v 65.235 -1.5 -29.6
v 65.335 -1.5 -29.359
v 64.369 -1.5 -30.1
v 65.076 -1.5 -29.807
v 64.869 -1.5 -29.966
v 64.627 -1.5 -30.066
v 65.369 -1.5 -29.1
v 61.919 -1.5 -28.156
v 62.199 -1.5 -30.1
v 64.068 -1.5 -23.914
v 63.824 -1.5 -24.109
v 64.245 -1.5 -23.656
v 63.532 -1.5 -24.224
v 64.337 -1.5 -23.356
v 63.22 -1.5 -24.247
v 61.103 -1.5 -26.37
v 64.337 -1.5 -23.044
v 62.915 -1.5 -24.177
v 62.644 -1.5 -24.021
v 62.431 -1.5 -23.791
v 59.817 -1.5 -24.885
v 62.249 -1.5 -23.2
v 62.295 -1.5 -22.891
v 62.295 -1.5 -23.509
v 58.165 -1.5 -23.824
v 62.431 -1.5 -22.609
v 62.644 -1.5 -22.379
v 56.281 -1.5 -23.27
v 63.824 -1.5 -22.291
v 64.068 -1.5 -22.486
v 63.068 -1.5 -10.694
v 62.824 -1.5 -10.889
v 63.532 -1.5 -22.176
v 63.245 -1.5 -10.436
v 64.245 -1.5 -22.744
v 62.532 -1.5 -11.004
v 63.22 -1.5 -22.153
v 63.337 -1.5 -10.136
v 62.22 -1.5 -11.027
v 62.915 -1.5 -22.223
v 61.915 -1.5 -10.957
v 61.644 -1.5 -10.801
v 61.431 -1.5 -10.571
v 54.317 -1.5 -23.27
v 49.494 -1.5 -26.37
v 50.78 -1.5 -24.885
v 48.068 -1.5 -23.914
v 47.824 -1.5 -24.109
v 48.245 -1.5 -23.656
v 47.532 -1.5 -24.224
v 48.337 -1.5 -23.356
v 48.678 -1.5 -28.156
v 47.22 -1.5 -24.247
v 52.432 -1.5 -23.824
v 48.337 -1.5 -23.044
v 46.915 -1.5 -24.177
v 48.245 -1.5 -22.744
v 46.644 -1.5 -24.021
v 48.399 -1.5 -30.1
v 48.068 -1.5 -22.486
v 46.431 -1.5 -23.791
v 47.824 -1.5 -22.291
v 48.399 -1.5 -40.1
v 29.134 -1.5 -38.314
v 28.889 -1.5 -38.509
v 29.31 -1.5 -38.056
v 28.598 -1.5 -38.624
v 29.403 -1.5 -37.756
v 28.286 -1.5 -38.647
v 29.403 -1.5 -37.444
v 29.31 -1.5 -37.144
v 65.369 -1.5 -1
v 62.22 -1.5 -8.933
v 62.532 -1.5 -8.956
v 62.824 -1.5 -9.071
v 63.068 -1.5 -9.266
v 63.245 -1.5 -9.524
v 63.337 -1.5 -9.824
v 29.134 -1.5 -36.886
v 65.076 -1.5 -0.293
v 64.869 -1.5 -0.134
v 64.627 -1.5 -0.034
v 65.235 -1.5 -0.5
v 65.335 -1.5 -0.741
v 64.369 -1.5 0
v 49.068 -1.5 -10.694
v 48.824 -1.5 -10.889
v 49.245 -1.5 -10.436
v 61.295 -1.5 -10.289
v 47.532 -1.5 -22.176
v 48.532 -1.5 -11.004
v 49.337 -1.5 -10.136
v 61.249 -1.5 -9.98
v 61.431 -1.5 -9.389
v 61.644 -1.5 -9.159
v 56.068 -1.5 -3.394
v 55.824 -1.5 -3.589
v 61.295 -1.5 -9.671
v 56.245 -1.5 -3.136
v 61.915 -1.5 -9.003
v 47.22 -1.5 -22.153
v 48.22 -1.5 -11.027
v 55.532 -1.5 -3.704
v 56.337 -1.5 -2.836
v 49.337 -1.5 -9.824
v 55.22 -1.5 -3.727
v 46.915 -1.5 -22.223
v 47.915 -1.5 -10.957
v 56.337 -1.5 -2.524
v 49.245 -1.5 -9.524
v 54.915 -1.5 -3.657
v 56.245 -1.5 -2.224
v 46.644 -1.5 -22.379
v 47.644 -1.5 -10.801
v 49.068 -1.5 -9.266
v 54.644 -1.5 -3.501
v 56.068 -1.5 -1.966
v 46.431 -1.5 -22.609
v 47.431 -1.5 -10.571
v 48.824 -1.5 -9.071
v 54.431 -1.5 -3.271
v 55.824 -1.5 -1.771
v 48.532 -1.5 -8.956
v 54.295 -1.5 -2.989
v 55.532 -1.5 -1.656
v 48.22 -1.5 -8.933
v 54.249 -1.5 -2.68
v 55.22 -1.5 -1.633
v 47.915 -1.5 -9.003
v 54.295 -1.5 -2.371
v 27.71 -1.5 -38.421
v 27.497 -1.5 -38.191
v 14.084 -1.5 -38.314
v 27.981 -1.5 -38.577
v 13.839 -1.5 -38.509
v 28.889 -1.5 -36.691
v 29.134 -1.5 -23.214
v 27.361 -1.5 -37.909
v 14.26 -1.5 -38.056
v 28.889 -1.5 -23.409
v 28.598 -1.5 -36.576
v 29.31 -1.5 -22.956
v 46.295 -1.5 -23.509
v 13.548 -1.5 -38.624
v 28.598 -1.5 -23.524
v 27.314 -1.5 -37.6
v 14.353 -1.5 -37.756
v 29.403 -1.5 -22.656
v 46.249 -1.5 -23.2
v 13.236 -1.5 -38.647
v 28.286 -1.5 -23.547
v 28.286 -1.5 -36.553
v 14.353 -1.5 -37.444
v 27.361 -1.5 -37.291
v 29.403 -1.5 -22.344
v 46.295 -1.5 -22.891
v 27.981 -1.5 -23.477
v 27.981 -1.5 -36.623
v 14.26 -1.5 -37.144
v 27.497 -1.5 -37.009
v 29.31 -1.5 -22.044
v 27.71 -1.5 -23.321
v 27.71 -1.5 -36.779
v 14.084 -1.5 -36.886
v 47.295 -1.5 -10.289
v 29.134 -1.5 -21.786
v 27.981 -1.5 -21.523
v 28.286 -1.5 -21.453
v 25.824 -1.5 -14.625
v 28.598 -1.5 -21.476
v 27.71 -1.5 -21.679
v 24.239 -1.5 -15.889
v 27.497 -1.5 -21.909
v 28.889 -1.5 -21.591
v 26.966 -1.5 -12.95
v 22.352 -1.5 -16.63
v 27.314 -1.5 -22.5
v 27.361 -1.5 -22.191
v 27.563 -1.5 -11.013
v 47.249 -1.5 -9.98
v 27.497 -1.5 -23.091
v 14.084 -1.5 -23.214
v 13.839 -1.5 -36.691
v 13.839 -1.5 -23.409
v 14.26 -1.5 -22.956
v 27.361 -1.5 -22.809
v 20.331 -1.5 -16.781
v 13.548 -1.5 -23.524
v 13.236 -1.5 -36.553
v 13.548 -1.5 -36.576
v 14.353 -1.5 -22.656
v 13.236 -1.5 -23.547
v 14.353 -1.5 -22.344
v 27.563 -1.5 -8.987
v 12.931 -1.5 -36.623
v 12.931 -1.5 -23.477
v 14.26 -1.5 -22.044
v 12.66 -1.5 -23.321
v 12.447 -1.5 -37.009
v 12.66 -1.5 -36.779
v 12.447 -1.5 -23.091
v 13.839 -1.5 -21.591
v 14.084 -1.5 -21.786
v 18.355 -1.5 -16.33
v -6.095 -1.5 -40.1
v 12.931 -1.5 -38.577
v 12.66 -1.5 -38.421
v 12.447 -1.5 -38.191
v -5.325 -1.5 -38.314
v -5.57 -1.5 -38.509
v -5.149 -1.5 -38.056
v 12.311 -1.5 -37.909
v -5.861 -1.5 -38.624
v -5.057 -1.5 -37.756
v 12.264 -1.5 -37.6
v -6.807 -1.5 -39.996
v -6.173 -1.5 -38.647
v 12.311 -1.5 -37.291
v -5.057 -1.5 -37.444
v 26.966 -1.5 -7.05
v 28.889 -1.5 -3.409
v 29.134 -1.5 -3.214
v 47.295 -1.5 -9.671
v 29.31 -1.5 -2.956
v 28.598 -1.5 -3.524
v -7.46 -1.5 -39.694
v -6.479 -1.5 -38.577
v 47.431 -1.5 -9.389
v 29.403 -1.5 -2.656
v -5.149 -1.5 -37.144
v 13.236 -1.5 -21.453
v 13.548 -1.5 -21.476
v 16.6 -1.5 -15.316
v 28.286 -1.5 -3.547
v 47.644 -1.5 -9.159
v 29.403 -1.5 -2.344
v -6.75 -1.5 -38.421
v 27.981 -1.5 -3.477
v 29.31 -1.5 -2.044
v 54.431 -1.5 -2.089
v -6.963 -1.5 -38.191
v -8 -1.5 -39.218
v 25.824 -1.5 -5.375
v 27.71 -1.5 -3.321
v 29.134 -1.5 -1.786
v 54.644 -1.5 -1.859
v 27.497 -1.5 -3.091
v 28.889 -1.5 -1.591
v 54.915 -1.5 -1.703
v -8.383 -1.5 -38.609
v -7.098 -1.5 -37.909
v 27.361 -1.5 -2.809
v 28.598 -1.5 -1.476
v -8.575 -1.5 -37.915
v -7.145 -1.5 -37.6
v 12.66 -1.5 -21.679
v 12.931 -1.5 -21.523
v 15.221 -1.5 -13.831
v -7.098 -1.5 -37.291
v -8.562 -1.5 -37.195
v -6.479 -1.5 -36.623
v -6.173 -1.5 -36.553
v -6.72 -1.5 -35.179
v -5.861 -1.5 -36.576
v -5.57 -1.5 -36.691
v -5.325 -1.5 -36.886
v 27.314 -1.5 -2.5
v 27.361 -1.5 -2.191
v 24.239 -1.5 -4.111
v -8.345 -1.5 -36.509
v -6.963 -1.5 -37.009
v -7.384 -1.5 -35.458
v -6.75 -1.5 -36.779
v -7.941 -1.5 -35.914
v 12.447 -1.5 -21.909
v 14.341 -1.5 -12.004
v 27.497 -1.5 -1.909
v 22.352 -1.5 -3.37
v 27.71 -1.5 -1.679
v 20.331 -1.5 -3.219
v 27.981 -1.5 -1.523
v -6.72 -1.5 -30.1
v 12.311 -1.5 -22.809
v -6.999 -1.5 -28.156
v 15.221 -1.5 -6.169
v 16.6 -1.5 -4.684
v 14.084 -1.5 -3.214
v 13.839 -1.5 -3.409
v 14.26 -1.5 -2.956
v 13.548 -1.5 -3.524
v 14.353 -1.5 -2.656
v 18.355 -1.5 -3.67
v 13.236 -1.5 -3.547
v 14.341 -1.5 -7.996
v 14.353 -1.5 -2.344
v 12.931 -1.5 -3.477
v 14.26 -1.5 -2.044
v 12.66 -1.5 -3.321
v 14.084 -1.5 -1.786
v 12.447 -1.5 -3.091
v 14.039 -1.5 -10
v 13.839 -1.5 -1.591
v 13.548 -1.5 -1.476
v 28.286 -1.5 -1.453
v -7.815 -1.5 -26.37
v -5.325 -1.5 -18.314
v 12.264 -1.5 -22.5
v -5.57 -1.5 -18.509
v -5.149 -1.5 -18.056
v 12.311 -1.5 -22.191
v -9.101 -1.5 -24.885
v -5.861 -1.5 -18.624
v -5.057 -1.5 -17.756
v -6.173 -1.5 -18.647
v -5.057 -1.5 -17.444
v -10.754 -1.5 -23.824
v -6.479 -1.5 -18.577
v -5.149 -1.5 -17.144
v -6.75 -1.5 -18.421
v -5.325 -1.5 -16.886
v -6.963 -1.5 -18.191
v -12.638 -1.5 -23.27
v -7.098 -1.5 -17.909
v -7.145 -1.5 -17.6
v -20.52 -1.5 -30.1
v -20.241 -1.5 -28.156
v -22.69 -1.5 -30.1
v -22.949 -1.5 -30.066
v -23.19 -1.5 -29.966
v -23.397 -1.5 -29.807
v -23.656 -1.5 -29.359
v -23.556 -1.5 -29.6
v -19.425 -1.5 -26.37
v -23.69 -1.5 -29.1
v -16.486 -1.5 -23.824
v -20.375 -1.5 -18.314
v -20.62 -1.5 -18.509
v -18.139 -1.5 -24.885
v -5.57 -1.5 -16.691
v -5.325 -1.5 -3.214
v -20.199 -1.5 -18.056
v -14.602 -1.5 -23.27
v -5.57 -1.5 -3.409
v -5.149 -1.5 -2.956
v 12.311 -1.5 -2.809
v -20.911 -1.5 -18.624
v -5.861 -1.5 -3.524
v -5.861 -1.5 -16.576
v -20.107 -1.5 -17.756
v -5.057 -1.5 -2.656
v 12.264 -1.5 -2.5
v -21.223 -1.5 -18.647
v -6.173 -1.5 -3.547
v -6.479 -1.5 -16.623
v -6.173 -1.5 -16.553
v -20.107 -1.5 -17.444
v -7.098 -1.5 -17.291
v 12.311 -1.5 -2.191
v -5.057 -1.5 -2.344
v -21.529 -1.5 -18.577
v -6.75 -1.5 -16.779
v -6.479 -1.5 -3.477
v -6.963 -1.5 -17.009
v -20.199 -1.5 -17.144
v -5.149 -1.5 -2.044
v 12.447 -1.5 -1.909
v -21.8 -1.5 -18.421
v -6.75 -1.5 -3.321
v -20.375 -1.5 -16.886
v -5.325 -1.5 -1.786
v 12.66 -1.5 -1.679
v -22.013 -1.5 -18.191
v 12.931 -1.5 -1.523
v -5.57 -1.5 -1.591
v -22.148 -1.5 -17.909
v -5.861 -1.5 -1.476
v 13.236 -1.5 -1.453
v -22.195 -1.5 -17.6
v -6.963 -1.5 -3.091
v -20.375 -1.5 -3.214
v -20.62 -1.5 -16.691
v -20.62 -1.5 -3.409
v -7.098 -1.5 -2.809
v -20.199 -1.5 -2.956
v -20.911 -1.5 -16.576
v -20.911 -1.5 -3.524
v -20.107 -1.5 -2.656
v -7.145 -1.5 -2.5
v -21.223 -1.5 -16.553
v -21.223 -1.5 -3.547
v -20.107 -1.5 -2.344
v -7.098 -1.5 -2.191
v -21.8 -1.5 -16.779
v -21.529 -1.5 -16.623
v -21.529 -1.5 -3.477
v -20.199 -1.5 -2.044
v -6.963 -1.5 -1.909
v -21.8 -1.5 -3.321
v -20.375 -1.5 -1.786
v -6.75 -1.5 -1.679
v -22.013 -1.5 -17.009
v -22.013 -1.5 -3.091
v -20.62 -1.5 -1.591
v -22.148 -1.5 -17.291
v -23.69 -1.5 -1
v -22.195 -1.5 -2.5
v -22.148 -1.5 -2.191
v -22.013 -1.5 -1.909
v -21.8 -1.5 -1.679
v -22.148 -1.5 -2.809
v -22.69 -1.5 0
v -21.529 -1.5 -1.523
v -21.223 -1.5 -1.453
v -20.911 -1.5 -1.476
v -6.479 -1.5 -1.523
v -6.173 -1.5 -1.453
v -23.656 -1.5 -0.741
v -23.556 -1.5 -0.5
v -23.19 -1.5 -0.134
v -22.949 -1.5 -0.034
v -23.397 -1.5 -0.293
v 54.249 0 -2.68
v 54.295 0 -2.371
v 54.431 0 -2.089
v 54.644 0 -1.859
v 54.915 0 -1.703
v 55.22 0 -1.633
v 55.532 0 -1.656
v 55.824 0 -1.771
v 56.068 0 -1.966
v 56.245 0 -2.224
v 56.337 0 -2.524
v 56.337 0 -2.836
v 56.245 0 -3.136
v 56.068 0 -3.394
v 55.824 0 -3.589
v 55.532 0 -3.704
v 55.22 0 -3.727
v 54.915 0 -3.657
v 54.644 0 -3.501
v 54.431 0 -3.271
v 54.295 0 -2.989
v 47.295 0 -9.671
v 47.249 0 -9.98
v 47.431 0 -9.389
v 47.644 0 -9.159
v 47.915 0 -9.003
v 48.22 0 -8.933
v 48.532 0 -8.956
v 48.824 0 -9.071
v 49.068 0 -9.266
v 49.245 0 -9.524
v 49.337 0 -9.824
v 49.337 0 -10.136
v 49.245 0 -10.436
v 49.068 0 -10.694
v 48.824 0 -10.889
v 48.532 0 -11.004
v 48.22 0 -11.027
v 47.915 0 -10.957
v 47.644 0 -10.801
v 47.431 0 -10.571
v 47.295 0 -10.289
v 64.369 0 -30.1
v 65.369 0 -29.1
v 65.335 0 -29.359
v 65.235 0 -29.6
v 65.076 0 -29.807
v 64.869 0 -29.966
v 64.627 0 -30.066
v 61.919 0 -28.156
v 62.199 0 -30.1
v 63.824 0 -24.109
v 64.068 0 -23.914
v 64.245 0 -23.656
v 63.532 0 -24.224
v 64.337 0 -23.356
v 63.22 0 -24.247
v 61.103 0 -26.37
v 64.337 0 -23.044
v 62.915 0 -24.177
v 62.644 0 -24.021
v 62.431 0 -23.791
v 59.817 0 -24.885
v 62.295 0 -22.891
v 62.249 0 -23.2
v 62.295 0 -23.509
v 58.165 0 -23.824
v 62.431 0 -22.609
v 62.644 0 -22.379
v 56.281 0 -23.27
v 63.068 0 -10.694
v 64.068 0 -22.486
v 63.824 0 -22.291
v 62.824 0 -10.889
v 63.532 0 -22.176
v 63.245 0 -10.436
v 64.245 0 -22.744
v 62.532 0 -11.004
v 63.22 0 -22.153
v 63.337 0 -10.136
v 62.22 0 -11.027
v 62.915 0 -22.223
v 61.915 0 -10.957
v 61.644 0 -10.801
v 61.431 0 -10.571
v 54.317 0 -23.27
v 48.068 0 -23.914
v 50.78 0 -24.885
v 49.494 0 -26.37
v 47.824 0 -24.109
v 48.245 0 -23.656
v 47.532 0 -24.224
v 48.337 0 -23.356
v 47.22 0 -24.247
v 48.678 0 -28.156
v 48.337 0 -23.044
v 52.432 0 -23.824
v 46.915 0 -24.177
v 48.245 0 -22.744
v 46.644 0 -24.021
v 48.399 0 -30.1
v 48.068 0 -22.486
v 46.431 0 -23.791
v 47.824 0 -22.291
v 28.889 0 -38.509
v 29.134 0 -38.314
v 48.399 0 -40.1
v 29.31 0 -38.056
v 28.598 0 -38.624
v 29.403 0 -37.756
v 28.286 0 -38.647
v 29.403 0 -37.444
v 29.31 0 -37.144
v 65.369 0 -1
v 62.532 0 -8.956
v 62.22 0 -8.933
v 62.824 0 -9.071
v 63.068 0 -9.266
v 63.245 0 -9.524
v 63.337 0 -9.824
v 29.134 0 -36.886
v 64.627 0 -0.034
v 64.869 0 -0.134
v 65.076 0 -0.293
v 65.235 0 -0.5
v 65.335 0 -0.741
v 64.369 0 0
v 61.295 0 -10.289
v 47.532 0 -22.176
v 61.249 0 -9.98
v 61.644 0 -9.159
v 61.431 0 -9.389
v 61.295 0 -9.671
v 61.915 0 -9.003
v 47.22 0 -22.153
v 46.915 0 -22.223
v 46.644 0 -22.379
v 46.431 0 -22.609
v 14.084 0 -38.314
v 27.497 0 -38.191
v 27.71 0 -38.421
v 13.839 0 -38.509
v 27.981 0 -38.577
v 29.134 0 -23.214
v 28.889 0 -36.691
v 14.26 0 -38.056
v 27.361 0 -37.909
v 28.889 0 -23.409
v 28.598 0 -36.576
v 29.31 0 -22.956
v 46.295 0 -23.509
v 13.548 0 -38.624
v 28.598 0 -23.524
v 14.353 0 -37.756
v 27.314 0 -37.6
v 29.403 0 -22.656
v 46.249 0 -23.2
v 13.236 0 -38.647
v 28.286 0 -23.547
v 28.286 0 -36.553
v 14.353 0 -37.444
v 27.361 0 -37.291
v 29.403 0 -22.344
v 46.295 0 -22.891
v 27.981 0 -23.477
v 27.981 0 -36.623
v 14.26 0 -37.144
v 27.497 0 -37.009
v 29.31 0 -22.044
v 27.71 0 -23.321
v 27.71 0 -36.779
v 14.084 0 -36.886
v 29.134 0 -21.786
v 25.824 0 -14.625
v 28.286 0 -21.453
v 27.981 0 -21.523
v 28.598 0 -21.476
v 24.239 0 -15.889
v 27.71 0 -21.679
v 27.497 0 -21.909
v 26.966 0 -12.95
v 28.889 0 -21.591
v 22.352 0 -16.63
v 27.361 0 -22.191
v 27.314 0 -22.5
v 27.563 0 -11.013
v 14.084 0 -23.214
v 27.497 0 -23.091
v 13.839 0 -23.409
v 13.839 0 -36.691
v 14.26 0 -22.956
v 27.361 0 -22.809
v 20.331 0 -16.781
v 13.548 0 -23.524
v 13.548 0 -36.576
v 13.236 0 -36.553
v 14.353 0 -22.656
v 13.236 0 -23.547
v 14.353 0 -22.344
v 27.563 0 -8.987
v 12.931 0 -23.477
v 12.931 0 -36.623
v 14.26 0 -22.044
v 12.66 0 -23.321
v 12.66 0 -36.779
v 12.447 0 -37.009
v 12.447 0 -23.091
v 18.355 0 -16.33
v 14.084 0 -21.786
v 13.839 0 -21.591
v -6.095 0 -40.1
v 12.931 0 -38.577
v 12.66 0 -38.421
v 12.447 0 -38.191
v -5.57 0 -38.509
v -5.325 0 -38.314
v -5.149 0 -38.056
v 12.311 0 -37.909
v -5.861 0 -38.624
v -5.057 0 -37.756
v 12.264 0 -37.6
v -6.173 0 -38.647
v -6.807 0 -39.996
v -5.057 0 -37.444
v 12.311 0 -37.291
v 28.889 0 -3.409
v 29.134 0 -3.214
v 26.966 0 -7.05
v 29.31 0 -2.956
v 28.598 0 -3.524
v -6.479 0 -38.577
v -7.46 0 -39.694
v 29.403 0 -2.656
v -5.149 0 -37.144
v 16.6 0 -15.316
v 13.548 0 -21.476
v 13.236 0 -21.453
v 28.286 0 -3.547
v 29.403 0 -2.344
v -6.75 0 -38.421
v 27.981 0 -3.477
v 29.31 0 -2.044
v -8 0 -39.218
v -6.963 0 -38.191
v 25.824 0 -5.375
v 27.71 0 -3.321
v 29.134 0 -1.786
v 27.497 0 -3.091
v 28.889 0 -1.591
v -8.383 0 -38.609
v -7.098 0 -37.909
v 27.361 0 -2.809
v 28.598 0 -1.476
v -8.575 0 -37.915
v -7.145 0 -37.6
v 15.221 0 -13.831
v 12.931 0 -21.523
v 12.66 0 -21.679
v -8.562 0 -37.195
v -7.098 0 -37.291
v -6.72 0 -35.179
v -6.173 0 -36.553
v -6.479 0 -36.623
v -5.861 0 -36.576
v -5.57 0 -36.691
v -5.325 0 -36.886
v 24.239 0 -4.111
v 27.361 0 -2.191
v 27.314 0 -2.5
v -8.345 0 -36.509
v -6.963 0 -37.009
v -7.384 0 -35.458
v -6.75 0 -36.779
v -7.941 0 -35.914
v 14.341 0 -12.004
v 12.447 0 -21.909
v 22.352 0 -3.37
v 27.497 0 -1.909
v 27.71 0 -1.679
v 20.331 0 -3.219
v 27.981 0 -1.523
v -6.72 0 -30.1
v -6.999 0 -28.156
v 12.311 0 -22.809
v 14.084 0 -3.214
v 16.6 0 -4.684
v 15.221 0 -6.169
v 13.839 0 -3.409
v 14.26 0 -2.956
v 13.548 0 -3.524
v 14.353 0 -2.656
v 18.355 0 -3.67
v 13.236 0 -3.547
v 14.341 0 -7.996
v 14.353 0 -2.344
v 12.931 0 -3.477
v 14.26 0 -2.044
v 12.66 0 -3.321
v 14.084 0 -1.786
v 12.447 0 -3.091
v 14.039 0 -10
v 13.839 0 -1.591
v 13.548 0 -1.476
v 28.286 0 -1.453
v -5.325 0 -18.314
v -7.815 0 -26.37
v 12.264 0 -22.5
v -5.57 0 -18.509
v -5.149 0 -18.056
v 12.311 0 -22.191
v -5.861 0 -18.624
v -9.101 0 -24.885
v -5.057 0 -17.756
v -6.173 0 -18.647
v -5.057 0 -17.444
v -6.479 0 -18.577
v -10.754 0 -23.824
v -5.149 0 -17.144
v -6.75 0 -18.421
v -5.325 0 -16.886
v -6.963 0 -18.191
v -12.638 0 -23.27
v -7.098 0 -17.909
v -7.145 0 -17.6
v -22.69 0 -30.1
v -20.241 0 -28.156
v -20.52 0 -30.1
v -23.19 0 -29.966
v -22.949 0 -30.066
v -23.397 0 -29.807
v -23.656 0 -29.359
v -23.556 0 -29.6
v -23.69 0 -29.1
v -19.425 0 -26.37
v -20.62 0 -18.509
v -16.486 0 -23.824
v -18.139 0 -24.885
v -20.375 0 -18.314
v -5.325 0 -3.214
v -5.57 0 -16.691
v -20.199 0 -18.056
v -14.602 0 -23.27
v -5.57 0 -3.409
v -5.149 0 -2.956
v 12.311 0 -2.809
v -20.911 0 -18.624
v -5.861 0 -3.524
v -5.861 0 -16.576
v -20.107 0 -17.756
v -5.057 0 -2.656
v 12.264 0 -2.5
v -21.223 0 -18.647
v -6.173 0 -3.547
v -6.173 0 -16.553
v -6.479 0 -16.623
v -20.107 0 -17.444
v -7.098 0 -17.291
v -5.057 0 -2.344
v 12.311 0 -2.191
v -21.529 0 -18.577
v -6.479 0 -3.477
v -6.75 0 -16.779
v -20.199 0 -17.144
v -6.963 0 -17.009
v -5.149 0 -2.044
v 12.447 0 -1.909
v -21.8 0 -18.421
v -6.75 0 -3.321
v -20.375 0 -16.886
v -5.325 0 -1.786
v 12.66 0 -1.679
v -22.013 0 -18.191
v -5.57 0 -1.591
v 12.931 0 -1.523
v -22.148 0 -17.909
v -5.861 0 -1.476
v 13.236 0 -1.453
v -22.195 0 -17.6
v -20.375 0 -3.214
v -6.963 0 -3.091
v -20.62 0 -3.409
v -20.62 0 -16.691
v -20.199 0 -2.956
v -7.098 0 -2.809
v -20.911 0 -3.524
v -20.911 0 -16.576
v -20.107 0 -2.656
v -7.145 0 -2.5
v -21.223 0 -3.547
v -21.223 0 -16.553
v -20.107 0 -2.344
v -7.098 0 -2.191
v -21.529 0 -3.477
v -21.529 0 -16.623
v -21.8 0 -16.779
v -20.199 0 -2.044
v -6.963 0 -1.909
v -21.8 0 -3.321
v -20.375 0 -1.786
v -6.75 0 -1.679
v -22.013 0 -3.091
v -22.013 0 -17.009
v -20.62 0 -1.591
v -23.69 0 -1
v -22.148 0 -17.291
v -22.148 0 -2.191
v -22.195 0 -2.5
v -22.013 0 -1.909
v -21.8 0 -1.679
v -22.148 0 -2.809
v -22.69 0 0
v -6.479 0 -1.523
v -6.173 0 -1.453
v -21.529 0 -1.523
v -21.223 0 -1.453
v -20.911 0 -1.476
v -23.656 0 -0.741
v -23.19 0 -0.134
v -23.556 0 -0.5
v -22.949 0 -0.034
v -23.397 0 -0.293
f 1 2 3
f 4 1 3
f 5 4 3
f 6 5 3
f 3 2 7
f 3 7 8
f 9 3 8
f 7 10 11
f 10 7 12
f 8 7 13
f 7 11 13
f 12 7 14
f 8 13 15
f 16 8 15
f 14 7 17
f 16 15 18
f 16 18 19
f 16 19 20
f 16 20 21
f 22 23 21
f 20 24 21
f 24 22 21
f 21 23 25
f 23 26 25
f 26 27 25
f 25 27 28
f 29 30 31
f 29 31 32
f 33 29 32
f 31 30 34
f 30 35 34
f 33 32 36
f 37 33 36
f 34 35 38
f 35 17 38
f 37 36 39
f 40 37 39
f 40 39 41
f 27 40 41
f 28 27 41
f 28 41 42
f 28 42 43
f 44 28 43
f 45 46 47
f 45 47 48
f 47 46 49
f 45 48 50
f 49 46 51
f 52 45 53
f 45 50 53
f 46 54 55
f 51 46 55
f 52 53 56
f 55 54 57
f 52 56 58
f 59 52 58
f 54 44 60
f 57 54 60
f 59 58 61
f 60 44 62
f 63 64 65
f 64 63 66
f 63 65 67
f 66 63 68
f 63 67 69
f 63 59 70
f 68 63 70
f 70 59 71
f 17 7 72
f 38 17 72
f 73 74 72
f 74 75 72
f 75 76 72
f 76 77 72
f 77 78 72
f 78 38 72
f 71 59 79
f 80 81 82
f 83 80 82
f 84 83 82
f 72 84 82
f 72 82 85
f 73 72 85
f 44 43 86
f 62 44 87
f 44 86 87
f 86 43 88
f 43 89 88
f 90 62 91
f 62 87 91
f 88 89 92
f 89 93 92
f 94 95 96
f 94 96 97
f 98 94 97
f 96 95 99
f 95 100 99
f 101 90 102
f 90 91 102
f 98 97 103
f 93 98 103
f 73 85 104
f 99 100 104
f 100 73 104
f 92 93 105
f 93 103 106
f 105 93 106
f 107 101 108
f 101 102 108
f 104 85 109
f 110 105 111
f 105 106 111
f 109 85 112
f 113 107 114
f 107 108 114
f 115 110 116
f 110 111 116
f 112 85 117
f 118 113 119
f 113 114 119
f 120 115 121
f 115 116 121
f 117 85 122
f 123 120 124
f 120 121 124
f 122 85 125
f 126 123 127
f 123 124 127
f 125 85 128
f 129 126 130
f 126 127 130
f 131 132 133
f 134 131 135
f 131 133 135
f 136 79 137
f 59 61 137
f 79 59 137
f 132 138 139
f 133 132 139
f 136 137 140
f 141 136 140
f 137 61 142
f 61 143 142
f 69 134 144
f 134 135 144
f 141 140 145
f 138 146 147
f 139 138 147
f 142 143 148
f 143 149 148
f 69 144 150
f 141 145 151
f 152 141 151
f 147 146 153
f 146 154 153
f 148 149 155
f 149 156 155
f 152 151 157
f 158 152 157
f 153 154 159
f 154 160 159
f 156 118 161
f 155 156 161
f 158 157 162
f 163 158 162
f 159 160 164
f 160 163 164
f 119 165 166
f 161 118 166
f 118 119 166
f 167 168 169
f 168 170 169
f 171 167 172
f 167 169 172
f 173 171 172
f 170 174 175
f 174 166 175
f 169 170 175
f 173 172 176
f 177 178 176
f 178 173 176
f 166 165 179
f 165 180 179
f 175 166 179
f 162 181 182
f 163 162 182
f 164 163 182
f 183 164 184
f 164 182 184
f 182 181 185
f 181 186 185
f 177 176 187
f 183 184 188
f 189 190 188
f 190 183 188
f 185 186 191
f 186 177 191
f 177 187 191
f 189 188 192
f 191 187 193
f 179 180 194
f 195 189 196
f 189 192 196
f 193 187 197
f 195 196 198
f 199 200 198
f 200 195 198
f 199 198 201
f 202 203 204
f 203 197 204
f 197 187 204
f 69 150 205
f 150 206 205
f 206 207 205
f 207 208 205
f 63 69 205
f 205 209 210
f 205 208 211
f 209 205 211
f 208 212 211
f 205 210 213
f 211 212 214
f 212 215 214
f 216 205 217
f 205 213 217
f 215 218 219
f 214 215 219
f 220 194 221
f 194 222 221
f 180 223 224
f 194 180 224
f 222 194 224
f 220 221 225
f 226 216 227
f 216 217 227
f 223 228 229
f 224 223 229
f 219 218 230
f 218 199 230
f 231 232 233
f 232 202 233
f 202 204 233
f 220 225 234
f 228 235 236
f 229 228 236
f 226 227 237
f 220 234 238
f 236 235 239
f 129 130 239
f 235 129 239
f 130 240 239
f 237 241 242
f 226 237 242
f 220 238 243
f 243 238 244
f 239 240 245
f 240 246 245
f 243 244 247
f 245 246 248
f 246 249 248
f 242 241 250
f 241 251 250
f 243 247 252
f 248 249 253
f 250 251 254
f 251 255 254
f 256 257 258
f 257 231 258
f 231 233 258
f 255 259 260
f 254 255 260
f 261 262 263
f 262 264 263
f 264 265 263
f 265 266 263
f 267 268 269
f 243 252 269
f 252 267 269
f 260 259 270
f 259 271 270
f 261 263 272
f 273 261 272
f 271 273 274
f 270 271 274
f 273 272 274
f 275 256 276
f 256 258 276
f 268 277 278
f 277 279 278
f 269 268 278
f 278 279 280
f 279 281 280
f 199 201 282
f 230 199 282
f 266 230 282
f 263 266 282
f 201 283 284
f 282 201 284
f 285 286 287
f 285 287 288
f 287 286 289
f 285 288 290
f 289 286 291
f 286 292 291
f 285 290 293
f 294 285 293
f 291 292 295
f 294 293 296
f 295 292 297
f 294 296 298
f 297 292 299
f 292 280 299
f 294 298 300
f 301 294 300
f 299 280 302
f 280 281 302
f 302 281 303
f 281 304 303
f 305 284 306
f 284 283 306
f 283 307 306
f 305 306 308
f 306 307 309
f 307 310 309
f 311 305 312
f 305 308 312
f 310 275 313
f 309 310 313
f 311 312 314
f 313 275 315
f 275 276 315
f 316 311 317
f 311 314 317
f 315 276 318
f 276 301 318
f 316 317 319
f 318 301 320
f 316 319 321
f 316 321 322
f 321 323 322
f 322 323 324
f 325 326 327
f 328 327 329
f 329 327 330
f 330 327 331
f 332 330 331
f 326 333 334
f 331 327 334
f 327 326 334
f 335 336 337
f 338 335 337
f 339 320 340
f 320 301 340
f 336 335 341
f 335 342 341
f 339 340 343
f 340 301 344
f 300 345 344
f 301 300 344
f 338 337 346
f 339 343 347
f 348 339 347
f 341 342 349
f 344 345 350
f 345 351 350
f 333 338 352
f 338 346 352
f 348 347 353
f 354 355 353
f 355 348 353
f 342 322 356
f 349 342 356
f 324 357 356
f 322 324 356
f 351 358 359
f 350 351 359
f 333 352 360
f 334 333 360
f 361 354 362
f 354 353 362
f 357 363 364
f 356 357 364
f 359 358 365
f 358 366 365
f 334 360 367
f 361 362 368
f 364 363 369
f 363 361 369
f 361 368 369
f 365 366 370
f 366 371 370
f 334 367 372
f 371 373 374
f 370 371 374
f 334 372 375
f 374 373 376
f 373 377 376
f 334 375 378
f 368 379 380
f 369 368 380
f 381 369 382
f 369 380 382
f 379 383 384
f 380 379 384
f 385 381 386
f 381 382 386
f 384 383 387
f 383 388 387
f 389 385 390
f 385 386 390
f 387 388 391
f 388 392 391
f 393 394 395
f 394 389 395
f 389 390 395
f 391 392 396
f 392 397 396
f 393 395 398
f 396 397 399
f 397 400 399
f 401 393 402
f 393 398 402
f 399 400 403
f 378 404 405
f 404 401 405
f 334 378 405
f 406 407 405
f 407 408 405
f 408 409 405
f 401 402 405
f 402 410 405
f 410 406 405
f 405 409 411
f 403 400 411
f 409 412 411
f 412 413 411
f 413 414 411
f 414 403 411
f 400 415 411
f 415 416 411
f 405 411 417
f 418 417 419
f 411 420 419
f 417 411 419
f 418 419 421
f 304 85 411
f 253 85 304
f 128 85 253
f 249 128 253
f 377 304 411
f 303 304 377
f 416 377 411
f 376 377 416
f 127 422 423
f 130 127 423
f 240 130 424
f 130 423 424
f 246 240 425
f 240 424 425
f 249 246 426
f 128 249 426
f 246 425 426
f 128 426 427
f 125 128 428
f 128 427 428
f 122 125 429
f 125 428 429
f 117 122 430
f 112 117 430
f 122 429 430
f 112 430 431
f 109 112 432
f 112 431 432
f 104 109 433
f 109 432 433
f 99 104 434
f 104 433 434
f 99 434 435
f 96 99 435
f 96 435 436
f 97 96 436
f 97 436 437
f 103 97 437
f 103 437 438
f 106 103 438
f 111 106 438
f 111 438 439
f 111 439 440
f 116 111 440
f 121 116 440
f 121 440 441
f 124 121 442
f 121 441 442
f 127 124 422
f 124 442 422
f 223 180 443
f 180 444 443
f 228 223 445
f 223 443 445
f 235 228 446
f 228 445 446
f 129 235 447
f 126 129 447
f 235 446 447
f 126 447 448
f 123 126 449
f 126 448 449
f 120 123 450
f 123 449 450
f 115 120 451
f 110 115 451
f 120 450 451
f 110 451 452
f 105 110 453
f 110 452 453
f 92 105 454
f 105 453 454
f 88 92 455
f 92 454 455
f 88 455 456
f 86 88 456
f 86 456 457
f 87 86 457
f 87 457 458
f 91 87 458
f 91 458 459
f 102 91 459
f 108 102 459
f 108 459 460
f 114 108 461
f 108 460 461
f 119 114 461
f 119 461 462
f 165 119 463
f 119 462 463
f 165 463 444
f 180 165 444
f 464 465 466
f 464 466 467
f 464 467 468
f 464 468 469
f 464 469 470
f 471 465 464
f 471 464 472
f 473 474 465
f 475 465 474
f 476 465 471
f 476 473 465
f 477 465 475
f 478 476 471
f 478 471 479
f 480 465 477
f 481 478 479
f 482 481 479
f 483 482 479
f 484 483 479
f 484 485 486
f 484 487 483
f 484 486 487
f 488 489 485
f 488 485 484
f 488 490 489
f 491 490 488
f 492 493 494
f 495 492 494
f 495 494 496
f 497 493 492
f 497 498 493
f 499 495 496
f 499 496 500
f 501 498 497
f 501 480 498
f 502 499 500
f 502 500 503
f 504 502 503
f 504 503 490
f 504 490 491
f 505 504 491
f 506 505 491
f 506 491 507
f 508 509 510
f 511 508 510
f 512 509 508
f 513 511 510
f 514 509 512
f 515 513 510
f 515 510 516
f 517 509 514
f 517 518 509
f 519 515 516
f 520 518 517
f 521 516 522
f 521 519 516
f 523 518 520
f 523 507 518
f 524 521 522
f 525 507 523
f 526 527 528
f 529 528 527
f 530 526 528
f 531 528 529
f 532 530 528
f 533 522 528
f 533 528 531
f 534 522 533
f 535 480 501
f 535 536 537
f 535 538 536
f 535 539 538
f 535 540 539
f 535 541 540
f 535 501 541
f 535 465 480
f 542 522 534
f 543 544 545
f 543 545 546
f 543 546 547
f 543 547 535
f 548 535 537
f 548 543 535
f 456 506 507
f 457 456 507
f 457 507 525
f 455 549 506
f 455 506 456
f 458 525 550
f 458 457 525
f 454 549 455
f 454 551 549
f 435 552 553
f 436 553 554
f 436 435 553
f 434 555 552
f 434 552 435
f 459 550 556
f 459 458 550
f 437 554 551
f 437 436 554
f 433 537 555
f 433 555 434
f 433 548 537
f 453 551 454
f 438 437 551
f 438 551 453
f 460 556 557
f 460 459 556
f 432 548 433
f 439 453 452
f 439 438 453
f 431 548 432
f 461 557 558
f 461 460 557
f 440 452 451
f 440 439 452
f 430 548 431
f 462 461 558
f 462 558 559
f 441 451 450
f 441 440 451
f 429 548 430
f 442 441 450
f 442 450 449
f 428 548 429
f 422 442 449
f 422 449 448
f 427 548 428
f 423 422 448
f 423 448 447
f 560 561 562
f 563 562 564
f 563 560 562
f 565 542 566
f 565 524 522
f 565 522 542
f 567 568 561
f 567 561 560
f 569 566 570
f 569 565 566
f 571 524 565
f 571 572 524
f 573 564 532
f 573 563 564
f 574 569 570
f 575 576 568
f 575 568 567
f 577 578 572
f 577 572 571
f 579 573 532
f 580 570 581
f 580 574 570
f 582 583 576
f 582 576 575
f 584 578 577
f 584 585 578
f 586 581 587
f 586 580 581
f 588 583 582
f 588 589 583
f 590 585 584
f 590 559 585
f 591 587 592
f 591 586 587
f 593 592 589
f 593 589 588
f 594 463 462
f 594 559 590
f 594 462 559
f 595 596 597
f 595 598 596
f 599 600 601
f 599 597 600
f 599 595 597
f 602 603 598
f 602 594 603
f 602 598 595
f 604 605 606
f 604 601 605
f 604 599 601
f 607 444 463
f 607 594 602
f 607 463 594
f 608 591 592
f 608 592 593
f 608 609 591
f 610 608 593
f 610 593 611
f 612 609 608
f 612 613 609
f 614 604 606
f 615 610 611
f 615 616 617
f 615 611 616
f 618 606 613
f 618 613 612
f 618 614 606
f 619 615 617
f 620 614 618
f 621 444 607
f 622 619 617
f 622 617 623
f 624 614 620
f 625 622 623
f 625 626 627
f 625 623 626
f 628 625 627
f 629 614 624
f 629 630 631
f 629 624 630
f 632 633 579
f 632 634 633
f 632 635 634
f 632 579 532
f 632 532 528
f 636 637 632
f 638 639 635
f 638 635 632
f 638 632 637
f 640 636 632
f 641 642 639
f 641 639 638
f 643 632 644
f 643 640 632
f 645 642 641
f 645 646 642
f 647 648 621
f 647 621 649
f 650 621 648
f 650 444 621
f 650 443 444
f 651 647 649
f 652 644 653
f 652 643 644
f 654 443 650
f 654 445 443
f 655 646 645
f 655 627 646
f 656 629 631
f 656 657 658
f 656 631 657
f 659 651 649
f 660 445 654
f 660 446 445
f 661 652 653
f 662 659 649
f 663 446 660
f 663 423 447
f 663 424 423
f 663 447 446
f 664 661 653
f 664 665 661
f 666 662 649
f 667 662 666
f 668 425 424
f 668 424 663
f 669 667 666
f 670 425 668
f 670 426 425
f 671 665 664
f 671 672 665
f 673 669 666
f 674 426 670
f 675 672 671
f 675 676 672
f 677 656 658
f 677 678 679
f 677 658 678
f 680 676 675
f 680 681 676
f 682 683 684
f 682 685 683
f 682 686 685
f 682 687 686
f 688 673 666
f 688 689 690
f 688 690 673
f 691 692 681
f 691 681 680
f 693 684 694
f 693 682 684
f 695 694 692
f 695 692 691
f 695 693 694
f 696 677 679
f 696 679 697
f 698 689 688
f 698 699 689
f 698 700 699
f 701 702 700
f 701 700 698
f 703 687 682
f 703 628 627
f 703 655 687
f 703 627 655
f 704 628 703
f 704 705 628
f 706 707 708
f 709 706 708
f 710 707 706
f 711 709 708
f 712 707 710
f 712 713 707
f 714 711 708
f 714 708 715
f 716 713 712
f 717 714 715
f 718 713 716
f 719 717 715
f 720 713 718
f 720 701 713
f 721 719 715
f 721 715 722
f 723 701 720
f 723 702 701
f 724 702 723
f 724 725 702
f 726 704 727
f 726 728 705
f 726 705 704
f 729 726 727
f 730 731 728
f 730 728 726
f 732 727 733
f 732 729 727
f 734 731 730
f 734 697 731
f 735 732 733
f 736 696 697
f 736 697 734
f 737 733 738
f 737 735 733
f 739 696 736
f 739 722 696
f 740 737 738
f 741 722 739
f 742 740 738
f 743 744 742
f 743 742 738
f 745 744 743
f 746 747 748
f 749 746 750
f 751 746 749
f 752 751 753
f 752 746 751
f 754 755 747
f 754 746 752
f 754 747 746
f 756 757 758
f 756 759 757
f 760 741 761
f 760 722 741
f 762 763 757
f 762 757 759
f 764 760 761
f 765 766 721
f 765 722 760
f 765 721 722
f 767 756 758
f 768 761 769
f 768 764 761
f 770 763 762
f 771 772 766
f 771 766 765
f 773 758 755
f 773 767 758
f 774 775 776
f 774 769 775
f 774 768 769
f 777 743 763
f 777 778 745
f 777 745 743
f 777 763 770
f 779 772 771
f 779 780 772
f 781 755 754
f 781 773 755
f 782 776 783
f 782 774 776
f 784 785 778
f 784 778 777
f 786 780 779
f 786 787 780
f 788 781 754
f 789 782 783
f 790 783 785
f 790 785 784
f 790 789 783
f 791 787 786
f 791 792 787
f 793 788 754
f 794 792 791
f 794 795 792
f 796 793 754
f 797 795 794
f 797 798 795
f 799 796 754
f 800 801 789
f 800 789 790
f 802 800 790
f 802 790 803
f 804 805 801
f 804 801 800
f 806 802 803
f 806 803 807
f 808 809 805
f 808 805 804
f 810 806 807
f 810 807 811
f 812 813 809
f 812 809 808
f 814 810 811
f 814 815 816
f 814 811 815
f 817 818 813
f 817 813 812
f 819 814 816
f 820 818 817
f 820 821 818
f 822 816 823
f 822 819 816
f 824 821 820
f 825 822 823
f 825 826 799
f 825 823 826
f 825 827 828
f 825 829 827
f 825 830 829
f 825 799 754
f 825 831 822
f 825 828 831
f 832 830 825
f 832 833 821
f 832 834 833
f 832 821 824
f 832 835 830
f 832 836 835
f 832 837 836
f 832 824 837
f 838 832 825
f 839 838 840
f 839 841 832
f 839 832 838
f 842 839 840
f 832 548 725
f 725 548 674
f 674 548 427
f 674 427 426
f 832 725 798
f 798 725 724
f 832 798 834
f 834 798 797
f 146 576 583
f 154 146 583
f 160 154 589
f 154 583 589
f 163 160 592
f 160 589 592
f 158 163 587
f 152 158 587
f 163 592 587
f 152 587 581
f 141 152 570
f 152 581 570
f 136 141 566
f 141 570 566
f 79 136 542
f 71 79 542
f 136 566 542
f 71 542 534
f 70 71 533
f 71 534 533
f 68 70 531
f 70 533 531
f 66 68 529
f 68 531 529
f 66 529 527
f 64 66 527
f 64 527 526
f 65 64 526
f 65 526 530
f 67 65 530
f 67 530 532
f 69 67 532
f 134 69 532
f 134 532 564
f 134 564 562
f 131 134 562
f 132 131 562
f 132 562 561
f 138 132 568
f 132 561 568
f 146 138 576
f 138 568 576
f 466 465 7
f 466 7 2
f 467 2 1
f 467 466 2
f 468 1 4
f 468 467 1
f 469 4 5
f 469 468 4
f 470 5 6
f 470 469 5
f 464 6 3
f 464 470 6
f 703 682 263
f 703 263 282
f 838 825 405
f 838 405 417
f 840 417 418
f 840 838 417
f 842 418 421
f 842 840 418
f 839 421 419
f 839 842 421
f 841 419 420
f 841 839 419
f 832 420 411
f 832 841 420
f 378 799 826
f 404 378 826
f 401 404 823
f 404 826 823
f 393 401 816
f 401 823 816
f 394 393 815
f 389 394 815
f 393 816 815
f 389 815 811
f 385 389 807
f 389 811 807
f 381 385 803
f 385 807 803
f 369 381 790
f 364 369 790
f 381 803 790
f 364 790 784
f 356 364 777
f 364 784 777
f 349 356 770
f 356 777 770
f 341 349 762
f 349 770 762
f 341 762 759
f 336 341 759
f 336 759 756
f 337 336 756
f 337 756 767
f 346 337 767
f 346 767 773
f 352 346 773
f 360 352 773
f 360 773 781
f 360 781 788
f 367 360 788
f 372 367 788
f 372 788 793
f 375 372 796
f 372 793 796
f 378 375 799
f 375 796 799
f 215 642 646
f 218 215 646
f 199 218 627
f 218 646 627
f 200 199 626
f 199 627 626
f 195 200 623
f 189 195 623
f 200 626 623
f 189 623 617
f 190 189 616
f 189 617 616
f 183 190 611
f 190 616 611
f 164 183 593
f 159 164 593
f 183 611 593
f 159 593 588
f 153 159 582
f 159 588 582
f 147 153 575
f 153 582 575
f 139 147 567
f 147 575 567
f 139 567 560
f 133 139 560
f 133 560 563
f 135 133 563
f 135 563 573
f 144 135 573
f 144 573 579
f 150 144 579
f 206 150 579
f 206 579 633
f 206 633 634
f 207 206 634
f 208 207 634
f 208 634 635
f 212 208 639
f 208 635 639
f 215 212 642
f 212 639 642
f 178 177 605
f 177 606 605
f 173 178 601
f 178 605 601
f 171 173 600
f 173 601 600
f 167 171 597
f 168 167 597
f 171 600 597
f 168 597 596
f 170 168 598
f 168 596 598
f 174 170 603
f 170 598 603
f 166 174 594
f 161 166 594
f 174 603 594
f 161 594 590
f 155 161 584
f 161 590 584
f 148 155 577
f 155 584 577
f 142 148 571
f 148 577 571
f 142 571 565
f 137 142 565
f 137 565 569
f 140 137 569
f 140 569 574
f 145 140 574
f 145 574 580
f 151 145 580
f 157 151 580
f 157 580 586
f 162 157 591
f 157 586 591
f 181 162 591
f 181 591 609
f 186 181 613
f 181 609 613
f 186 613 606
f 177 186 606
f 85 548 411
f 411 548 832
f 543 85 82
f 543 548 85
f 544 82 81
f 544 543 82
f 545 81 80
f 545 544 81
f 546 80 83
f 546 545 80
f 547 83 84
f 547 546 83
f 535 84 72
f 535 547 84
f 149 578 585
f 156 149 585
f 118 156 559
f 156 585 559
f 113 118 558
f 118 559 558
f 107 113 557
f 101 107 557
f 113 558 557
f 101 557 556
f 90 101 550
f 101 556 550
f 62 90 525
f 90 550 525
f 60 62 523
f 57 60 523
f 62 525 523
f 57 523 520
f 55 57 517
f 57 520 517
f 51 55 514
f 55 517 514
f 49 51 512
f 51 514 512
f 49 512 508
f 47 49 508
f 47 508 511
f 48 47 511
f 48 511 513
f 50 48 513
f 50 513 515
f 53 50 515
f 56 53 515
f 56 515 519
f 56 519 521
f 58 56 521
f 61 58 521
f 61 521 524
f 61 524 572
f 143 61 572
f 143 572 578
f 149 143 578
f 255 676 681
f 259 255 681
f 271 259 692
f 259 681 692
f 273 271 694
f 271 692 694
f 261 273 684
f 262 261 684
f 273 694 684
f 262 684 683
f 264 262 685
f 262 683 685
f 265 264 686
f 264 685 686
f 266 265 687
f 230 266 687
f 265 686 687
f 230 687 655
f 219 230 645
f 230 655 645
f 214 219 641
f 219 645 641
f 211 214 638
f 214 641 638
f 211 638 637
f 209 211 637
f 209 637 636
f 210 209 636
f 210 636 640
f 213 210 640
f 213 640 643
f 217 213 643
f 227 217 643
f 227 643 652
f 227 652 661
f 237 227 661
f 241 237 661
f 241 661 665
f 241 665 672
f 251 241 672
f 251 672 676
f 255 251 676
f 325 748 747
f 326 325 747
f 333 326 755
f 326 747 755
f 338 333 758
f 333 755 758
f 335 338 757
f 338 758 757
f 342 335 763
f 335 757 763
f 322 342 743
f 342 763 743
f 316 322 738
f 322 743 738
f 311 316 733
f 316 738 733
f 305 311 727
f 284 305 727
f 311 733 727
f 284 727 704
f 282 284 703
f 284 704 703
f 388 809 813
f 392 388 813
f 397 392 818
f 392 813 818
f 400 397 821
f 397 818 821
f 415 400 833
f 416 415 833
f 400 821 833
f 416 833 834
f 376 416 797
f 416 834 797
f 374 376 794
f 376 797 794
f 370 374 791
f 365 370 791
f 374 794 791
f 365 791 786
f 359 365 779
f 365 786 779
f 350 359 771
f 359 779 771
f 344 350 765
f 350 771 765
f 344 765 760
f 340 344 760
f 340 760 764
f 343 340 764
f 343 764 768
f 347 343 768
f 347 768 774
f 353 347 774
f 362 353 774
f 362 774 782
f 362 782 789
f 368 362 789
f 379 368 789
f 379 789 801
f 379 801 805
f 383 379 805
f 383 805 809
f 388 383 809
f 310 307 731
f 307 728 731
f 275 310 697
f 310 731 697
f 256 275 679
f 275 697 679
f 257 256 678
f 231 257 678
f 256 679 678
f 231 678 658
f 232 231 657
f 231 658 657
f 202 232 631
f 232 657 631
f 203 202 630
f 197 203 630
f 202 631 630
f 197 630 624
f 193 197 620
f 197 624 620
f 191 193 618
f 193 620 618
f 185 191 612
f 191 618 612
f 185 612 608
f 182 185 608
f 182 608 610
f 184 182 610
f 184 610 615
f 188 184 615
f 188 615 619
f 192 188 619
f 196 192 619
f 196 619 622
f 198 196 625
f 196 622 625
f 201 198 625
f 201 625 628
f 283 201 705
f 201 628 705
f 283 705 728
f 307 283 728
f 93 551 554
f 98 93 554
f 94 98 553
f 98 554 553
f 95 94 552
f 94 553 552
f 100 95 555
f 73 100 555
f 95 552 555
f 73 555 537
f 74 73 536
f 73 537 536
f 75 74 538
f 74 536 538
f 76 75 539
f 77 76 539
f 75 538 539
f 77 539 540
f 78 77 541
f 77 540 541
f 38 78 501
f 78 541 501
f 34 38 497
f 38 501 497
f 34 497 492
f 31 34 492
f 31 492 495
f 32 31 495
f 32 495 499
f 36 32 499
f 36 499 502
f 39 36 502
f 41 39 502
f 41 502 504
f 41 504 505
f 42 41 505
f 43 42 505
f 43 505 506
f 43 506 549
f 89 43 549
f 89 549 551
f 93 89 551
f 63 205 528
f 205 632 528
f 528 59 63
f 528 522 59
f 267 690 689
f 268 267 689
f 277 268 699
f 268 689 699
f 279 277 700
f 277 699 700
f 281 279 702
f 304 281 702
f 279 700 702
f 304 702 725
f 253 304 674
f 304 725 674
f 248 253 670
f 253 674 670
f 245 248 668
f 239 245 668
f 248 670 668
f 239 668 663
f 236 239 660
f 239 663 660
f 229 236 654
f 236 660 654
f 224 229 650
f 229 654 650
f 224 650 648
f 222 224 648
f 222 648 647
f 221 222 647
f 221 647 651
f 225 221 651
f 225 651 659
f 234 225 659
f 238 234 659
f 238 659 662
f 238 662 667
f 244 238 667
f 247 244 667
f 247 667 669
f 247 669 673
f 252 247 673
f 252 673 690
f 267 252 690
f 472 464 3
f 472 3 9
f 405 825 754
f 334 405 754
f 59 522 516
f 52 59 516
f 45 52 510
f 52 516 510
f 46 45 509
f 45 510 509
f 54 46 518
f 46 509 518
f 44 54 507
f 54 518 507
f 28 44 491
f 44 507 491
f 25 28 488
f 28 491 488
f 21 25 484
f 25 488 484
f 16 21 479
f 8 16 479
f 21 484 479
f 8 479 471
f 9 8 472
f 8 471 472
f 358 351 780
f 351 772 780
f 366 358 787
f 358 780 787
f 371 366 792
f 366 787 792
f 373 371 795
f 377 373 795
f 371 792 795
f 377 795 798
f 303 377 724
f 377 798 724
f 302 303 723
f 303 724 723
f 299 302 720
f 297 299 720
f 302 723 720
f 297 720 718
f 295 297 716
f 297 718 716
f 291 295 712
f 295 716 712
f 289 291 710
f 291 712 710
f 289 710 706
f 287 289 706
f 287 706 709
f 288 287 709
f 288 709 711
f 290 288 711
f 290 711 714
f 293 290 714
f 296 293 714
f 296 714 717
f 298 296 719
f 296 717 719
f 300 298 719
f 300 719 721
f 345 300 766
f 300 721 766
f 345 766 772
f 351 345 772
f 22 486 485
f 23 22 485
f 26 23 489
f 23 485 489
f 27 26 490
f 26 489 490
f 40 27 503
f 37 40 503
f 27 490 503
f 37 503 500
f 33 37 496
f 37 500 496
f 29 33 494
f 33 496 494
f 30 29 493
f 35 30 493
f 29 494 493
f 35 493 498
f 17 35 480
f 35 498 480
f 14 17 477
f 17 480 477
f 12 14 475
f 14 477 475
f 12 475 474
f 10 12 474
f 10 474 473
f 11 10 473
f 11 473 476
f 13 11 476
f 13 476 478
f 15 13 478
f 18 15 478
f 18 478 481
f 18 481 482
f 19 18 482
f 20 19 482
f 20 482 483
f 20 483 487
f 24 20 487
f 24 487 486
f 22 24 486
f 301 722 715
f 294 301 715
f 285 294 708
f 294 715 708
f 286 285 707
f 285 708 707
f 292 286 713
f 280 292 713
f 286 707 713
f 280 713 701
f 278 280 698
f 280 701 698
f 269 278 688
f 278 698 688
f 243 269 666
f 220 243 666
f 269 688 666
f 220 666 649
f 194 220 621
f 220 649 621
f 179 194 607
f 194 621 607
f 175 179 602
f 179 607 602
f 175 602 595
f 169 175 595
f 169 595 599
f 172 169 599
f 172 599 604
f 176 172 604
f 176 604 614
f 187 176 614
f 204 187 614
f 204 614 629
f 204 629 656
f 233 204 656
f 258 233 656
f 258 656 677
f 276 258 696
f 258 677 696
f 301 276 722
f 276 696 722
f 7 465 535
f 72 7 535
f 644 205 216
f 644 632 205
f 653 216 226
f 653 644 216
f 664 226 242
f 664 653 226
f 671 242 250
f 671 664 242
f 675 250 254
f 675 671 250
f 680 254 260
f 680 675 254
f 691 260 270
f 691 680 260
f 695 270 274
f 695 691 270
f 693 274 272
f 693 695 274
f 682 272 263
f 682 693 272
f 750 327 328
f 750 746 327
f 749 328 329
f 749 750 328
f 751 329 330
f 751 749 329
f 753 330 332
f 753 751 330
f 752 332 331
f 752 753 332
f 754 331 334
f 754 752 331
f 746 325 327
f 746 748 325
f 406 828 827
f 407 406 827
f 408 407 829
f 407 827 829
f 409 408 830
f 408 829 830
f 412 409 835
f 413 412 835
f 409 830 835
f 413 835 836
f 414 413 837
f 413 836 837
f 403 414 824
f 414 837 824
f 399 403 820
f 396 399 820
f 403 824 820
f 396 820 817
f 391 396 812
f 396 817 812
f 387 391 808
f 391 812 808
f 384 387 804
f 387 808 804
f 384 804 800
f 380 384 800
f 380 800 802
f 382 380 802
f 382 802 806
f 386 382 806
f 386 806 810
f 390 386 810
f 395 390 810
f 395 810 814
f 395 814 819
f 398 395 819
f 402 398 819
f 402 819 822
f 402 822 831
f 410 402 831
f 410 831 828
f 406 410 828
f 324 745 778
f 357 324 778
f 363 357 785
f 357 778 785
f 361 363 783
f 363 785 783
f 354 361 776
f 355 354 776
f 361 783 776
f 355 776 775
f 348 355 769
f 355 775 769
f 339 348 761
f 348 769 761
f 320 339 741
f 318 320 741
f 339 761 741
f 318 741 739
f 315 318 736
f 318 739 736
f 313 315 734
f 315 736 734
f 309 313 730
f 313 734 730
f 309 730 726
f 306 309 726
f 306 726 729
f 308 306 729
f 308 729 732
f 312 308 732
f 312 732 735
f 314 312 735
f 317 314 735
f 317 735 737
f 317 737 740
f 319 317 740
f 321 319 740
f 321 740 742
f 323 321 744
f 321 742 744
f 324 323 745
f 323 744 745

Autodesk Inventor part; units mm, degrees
ref_plane "YZ Plane" through (0, 0, 0) normal (1, 0, 0) x (0, 1, 0)
ref_plane "XZ Plane" through (0, 0, 0) normal (0, 1, 0) x (-1, 0, 0)
ref_plane "XY Plane" through (0, 0, 0) normal (0, 0, 1) x (1, 0, 0)
sketch "Sketch1" plane through (0, 0, 0) normal (0, 1, 0) x (-1, 0, 0)
  line L0 (-0.4496, -40.1) -> (-0.4496, 0)
  line L1 (-41.2289, 0) -> (-41.2289, -40.1)
  circle A0 centre (6.095, -37.6) radius 1.05
  circle A1 centre (21.145, -17.6) radius 1.05
  circle A2 centre (6.095, -17.6) radius 1.05
  circle A3 centre (21.145, -2.5) radius 1.05
  circle A4 centre (6.095, -2.5) radius 1.05
  circle A5 centre (-28.3643, -37.6) radius 1.05
  circle A6 centre (-13.3143, -37.6) radius 1.05
  circle A7 centre (-28.3643, -22.5) radius 1.05
  circle A8 centre (-13.3143, -22.5) radius 1.05
  circle A9 centre (-28.3643, -2.5) radius 1.05
  circle A10 centre (-13.3143, -2.5) radius 1.05
  circle A11 centre (-20.8393, -10) radius 6.8
  circle A12 centre (-55.2986, -2.68) radius 1.05
  circle A13 centre (-62.2986, -9.98) radius 1.05
  circle A14 centre (-48.2986, -9.98) radius 1.05
  circle A15 centre (-63.2986, -23.2) radius 1.05
  circle A16 centre (-47.2986, -23.2) radius 1.05
  arc A17 (23.69, -1) -> (22.69, 0) centre (22.69, -1) ccw
  arc A18 (-64.3686, 0) -> (-65.3686, -1) centre (-64.3686, -1) ccw
  line L2 (-65.3686, -29.1) -> (-65.3686, -1)
  arc A19 (-65.3686, -29.1) -> (-64.3686, -30.1) centre (-64.3686, -29.1) ccw
  line L3 (-64.3686, -30.1) -> (-62.1986, -30.1)
  arc A20 (-48.3986, -30.1) -> (-62.1986, -30.1) centre (-55.2986, -30.1) ccw
  line L4 (-48.3986, -30.1) -> (-48.3986, -40.1)
  line L5 (6.095, -40.1) -> (-48.3986, -40.1)
  arc A21 (6.095, -40.1) -> (6.72, -35.1794) centre (6.095, -37.6) ccw
  line L6 (6.72, -35.1794) -> (6.72, -30.1)
  arc A22 (20.52, -30.1) -> (6.72, -30.1) centre (13.62, -30.1) ccw
  line L7 (20.52, -30.1) -> (22.69, -30.1)
  arc A23 (22.69, -30.1) -> (23.69, -29.1) centre (22.69, -29.1) ccw
  line L8 (23.69, -1) -> (23.69, -29.1)
  line L9 (-64.3686, 0) -> (22.69, 0)
  line L10 (-41.6786, -40.1) -> (-41.6786, 0)
  line L11 (-40.7793, 0) -> (-40.7793, -40.1)
  line L12 (-0.8993, -40.1) -> (-0.8993, 0)
  line L13 (0, 0) -> (0, -40.1)
  point P0 (0, 0)
extrude "Extrusion1" add sketch "Sketch1" against normal blind 1.5
properties part number "axis_3_top_frame"
